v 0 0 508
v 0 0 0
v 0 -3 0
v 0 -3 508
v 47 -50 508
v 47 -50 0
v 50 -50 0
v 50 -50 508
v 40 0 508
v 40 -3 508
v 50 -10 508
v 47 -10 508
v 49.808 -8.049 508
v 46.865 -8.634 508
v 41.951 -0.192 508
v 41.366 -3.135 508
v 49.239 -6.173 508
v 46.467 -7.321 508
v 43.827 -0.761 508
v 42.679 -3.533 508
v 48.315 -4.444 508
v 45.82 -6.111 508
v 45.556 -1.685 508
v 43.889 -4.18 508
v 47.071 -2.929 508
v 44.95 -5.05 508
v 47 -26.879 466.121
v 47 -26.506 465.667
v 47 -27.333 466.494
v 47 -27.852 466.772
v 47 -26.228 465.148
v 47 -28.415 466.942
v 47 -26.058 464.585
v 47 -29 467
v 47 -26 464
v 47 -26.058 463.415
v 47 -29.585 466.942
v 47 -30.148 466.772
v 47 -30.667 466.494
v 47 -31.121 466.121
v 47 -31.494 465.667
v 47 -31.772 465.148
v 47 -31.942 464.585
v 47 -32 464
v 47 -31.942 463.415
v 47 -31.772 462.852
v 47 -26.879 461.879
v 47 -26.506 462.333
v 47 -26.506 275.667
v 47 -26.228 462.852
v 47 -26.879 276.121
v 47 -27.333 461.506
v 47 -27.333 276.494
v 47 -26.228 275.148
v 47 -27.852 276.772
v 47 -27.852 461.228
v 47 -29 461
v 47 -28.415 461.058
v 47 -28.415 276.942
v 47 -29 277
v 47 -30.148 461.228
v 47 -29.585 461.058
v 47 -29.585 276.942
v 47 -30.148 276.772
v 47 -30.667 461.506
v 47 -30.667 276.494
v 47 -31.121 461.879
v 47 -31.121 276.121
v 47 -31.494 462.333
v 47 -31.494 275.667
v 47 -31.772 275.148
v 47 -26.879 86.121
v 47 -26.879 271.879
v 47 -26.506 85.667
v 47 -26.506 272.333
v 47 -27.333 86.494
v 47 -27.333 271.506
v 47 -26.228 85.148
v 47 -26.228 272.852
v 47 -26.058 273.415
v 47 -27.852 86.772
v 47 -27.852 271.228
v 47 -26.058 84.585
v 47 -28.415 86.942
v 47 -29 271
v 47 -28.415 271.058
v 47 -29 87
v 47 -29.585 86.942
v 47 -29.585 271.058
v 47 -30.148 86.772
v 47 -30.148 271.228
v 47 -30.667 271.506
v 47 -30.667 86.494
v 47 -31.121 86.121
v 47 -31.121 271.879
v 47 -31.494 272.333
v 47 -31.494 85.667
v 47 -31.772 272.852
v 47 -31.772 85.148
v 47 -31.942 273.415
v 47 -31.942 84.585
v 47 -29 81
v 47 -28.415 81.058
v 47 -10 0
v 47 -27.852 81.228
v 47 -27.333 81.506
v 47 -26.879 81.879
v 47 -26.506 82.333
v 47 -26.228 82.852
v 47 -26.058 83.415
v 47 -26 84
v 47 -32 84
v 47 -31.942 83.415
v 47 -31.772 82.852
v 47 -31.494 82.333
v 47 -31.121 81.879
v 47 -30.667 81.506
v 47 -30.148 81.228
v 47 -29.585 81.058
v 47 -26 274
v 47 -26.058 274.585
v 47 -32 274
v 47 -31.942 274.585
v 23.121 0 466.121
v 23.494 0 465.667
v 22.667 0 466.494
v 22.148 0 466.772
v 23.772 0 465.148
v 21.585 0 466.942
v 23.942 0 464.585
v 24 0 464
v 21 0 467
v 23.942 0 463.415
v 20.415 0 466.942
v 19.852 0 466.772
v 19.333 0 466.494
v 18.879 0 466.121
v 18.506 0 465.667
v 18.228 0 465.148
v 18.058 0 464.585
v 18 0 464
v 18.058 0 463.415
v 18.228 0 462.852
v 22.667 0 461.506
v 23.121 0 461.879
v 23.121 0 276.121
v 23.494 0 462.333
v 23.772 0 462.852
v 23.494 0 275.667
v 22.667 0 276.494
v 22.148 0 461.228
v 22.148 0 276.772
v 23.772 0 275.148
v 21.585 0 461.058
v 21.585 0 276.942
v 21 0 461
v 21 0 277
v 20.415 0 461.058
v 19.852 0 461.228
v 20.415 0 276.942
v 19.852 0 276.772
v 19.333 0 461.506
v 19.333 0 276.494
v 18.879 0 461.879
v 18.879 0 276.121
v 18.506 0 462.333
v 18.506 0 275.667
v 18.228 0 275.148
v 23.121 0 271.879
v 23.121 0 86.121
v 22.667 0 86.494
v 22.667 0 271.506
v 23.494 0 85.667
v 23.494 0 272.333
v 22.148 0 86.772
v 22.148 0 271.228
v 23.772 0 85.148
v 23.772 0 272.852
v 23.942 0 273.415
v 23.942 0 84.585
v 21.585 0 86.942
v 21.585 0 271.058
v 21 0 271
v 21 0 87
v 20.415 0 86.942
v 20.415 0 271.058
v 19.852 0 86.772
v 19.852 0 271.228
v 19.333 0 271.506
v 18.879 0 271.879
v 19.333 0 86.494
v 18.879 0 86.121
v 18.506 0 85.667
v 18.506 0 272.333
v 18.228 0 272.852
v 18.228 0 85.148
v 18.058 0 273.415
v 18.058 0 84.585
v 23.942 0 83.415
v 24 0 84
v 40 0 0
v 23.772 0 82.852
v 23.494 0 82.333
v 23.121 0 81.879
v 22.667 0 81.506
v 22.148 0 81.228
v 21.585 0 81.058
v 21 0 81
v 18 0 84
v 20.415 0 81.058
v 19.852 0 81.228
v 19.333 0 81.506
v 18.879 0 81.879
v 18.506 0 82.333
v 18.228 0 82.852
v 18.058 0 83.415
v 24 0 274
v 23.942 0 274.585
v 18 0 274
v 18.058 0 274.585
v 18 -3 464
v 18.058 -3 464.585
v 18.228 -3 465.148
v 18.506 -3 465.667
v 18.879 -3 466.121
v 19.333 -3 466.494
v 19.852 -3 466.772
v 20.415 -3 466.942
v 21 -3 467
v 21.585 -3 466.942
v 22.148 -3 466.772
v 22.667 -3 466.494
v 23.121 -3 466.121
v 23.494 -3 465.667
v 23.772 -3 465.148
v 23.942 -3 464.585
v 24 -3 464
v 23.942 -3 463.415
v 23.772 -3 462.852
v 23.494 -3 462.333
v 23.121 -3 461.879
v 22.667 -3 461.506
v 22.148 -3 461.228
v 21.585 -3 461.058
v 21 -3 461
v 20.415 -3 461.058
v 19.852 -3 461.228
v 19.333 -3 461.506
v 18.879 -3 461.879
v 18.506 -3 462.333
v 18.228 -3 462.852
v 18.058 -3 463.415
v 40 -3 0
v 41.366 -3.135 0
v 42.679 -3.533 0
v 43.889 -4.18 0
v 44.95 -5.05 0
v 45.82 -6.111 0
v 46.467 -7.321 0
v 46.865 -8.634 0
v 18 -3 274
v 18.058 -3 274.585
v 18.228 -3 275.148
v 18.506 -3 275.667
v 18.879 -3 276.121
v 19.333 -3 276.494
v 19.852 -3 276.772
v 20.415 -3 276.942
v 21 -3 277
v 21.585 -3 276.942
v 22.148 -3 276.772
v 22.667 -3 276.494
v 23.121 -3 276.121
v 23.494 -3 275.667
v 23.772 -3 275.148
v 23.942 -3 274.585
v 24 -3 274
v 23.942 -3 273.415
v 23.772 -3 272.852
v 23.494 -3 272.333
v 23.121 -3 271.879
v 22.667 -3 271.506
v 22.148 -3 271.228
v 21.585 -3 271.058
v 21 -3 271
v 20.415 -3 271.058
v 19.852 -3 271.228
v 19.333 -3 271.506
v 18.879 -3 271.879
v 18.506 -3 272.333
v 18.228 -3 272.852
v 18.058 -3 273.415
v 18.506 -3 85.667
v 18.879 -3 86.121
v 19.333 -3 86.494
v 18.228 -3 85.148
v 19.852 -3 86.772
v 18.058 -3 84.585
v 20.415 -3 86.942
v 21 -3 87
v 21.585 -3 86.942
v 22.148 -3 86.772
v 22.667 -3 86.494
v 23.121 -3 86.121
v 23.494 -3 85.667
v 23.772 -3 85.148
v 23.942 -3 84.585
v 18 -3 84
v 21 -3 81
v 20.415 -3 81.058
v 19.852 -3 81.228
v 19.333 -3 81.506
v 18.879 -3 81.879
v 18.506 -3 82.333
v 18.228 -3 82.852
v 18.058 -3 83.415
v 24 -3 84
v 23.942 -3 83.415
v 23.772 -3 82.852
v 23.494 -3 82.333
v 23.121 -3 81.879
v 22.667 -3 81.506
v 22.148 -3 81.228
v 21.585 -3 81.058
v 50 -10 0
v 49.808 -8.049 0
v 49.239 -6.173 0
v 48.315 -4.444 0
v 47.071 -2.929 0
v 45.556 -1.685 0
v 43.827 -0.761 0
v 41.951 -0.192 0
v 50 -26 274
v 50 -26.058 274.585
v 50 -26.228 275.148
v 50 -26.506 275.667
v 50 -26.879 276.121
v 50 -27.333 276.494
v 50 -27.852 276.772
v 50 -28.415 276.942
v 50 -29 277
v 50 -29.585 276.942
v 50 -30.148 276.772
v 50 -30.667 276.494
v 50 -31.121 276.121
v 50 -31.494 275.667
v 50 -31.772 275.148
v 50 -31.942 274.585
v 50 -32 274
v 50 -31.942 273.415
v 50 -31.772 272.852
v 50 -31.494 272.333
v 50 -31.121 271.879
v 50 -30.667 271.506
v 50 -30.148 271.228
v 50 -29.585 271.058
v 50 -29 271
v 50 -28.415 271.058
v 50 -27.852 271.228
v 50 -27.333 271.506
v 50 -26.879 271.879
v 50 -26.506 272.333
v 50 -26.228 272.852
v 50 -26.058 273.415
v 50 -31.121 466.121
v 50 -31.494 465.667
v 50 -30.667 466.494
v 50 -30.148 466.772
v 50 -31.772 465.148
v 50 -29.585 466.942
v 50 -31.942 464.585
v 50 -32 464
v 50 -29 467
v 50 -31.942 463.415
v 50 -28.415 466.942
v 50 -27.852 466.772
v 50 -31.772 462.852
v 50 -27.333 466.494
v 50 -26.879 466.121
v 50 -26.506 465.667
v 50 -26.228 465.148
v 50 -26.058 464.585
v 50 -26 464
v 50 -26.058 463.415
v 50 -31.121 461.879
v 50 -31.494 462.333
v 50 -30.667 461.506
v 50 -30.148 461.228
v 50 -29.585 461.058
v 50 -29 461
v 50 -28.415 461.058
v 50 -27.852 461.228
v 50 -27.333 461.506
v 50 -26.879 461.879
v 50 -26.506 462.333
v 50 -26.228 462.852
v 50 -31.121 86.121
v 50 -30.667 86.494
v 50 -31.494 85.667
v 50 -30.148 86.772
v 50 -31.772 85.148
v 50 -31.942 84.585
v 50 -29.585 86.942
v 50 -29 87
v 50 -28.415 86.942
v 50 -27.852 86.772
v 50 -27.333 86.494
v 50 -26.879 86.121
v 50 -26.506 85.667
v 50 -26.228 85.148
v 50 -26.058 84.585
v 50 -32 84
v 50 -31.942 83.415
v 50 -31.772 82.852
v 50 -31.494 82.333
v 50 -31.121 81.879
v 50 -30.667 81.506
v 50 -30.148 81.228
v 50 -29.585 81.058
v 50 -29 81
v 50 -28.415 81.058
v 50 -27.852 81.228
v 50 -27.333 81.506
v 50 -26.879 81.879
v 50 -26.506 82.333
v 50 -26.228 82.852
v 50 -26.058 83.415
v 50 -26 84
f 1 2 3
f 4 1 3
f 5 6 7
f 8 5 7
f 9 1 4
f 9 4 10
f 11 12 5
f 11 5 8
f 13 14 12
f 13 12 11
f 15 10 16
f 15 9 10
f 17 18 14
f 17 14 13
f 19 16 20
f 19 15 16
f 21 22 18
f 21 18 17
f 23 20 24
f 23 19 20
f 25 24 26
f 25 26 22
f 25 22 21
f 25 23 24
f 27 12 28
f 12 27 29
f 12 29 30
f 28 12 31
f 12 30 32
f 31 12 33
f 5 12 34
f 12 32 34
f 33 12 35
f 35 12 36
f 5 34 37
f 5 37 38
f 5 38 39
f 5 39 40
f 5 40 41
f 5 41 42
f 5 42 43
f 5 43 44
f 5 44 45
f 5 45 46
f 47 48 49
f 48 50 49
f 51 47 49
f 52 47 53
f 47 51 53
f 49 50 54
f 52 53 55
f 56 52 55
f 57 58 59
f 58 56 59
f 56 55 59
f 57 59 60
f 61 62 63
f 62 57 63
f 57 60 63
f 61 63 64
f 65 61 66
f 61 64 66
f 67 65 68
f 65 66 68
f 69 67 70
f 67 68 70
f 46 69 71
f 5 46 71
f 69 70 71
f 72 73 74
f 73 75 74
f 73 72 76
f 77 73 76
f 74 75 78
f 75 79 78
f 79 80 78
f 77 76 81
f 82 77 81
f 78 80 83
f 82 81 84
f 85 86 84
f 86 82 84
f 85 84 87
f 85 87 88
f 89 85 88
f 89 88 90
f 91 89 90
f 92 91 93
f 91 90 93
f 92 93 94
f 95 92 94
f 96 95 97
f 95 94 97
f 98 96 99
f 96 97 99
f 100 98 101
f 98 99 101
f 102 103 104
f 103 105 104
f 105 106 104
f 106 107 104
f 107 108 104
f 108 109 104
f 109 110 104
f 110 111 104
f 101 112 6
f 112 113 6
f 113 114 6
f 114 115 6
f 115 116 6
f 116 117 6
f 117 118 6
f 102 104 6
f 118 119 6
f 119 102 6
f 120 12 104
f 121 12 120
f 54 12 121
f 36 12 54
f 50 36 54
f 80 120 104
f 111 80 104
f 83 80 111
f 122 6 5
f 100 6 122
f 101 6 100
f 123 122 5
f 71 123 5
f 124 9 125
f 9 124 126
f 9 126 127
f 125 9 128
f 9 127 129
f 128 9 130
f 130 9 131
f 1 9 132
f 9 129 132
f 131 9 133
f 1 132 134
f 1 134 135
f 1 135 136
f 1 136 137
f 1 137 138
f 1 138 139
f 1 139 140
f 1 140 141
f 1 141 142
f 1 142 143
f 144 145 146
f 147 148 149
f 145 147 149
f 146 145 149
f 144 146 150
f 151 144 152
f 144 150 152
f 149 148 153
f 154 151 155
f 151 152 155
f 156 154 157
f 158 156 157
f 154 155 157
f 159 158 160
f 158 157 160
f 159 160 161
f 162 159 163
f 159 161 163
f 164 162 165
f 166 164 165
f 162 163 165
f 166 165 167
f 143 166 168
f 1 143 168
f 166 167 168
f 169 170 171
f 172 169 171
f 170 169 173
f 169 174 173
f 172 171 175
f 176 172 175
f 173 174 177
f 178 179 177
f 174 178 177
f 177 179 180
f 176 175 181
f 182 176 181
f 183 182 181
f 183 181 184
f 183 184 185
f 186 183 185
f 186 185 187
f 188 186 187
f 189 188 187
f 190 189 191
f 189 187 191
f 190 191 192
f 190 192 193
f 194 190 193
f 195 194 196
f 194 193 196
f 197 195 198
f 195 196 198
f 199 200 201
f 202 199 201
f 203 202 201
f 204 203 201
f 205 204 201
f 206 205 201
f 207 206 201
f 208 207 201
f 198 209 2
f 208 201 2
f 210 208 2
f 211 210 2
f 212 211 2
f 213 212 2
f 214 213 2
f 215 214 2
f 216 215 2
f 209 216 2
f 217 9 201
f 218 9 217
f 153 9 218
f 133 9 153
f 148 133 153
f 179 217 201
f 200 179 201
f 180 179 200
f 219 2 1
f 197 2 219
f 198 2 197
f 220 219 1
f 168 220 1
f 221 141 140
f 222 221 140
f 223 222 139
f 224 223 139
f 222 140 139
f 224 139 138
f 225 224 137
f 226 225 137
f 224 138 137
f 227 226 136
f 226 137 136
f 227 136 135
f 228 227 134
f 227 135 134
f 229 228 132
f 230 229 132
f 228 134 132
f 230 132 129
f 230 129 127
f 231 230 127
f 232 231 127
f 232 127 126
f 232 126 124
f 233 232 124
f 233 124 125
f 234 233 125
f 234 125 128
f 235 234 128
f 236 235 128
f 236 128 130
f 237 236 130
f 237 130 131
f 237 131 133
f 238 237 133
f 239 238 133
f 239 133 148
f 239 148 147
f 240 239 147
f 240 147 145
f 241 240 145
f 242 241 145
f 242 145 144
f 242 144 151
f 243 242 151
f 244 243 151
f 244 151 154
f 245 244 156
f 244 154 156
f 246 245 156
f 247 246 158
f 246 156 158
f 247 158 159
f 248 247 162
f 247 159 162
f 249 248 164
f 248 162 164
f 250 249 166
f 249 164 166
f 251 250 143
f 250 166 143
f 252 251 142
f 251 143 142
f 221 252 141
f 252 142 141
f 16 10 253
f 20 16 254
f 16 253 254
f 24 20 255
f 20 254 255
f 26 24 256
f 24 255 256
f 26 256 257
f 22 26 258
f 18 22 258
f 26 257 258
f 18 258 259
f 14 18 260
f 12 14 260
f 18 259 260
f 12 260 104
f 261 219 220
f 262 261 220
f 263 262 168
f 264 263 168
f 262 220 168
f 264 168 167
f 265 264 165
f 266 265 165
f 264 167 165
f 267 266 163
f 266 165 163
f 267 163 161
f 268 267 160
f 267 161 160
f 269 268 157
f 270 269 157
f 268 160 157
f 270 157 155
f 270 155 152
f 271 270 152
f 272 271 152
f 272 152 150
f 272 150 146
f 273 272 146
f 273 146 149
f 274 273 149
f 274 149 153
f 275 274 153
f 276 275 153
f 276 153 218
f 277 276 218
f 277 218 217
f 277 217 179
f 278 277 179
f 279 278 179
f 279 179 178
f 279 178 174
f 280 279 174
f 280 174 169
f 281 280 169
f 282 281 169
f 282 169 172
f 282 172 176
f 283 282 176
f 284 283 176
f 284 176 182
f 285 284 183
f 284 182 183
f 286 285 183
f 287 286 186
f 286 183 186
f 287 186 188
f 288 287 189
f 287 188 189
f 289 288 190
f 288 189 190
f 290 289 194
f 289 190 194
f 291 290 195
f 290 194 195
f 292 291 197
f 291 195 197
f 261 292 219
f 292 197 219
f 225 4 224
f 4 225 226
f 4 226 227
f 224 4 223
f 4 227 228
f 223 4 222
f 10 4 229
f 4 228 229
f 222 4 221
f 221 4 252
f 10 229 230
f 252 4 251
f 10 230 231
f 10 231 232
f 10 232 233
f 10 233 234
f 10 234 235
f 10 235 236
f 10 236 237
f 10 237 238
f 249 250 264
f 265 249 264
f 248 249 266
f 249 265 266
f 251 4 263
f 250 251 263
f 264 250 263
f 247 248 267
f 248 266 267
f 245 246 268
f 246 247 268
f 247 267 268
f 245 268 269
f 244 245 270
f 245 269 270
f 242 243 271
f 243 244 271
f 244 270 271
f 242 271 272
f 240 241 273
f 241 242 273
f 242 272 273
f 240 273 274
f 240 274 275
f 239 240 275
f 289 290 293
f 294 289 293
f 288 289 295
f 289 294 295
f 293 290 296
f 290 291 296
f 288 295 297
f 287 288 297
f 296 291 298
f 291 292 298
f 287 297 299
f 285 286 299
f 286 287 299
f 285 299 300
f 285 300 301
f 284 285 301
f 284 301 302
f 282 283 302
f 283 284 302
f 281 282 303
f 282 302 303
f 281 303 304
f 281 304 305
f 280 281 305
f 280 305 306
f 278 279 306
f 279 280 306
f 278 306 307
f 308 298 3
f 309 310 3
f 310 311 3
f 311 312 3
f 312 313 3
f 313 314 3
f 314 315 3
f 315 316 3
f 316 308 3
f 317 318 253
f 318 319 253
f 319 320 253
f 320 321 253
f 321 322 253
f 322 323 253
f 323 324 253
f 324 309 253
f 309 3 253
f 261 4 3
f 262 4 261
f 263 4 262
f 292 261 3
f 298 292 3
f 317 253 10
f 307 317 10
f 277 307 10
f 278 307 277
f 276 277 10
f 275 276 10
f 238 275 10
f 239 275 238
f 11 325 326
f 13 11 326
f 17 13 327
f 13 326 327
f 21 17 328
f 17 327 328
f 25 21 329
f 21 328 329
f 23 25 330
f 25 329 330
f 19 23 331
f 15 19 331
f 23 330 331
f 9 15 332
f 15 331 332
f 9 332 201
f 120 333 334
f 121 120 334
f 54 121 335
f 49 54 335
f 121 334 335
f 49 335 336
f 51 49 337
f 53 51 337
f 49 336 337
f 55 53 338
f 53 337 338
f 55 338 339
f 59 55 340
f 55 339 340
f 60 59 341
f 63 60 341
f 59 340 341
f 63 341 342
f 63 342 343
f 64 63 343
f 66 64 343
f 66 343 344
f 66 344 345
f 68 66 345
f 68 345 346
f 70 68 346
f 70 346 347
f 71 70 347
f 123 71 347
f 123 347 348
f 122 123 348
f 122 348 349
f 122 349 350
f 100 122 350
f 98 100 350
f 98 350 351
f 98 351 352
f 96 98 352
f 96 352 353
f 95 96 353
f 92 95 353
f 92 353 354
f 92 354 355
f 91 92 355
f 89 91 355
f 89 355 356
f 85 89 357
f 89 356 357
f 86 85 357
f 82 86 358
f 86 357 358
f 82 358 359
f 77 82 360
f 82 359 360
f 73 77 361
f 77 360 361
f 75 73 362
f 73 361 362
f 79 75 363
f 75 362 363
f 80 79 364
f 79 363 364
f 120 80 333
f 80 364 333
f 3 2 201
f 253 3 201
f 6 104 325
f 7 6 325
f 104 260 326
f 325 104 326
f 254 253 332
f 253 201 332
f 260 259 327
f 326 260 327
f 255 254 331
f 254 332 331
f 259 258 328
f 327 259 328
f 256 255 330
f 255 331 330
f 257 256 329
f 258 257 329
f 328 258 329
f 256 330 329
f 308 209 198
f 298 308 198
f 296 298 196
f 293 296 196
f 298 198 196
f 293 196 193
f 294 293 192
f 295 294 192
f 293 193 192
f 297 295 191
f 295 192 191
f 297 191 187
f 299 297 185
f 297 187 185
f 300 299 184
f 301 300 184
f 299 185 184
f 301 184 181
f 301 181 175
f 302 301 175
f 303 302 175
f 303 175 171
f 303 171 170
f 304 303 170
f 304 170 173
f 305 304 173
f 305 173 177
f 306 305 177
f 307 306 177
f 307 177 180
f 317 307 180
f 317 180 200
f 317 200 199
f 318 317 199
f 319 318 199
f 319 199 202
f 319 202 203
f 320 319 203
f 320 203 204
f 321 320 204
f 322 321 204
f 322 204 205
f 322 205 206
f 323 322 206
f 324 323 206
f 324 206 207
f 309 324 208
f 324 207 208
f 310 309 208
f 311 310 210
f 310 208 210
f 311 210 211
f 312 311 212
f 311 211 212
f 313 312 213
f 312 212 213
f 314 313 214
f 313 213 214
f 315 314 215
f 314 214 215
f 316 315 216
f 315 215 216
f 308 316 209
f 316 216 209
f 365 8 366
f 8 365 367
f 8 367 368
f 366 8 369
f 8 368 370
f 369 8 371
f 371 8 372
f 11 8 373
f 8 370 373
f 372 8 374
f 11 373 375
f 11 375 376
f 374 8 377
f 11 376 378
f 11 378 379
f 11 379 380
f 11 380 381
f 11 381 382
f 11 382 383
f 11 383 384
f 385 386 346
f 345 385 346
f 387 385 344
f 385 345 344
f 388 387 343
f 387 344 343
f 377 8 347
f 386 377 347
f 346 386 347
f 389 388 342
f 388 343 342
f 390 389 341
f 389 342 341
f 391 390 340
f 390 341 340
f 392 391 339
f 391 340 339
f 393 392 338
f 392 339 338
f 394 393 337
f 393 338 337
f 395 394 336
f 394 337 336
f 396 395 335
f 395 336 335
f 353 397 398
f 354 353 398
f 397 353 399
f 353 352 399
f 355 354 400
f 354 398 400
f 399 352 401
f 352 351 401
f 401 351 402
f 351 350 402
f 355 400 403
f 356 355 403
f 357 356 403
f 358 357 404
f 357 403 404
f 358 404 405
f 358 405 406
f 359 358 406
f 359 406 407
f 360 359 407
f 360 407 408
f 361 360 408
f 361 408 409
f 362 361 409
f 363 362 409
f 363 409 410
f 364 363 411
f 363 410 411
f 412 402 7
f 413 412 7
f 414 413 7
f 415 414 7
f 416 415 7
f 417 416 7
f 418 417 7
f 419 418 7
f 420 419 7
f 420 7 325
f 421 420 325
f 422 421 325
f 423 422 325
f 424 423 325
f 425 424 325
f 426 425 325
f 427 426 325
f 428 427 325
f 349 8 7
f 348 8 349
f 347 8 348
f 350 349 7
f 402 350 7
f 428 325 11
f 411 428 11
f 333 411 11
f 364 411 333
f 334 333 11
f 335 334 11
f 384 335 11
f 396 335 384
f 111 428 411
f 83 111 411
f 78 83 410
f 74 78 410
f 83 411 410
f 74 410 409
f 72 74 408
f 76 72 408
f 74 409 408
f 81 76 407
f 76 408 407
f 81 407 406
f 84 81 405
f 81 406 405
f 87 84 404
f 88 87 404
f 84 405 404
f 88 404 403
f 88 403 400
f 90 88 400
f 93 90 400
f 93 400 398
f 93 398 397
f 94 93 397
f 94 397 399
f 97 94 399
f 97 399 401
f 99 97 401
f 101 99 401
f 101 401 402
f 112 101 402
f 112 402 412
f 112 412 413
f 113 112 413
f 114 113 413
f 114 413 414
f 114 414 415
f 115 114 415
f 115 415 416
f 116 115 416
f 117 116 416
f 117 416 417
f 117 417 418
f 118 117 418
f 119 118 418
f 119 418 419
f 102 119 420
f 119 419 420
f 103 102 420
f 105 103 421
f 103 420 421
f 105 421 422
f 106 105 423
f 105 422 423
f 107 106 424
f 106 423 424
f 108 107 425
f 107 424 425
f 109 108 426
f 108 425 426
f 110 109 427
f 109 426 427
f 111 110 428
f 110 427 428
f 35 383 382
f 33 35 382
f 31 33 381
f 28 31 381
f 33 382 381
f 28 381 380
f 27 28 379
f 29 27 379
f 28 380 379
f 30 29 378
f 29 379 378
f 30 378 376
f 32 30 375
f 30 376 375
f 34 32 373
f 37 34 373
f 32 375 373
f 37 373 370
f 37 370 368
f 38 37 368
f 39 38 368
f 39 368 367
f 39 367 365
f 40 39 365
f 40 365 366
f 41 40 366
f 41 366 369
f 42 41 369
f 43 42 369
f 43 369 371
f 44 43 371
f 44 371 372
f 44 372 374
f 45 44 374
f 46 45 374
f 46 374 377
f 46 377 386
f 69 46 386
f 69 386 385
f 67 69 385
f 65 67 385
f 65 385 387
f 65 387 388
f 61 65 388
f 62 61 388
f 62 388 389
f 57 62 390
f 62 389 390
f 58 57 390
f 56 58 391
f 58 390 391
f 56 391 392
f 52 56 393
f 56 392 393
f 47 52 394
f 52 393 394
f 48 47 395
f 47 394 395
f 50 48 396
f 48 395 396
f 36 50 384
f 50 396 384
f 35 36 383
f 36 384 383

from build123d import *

# Parameters (mm, degrees)
F1_DEPTH = 508
F2_R     = 3
F3_DEPTH = 50.001
F4_R     = 3
F5_DEPTH = 50.001


with BuildPart() as f1:
    # F0 (on Top) → F1 (new body)
    with BuildSketch(Plane.XY):
        with BuildLine():
            Line((40, 0), (0, 0))
            Line((0, 0), (0, -3))
            Line((0, -3), (40, -3))
            ThreePointArc((40, -3), (44.949747, -5.050253), (47, -10))
            Line((47, -10), (47, -50))
            Line((47, -50), (50, -50))
            Line((50, -50), (50, -10))
            ThreePointArc((50, -10), (47.071068, -2.928932), (40, 0))
        make_face()
    extrude(amount=F1_DEPTH)

    # F2 (on face) → F3 (cut, through all)
    with BuildSketch(Plane(origin=(0, 0, 0), x_dir=(-1, 0, 0), z_dir=(0, 1, 0))):
        with Locations((-21, 464)):
            Circle(F2_R)
        with Locations((-21, 274)):
            Circle(F2_R)
        with Locations((-21, 84)):
            Circle(F2_R)
    extrude(amount=-F3_DEPTH, mode=Mode.SUBTRACT)

    # F4 (on face) → F5 (cut, through all)
    with BuildSketch(Plane.YZ.offset(50)):
        with Locations((-29, 464)):
            Circle(F4_R)
        with Locations((-29, 274)):
            Circle(F4_R)
        with Locations((-29, 84)):
            Circle(F4_R)
    extrude(amount=-F5_DEPTH, mode=Mode.SUBTRACT)


solid = f1.part
